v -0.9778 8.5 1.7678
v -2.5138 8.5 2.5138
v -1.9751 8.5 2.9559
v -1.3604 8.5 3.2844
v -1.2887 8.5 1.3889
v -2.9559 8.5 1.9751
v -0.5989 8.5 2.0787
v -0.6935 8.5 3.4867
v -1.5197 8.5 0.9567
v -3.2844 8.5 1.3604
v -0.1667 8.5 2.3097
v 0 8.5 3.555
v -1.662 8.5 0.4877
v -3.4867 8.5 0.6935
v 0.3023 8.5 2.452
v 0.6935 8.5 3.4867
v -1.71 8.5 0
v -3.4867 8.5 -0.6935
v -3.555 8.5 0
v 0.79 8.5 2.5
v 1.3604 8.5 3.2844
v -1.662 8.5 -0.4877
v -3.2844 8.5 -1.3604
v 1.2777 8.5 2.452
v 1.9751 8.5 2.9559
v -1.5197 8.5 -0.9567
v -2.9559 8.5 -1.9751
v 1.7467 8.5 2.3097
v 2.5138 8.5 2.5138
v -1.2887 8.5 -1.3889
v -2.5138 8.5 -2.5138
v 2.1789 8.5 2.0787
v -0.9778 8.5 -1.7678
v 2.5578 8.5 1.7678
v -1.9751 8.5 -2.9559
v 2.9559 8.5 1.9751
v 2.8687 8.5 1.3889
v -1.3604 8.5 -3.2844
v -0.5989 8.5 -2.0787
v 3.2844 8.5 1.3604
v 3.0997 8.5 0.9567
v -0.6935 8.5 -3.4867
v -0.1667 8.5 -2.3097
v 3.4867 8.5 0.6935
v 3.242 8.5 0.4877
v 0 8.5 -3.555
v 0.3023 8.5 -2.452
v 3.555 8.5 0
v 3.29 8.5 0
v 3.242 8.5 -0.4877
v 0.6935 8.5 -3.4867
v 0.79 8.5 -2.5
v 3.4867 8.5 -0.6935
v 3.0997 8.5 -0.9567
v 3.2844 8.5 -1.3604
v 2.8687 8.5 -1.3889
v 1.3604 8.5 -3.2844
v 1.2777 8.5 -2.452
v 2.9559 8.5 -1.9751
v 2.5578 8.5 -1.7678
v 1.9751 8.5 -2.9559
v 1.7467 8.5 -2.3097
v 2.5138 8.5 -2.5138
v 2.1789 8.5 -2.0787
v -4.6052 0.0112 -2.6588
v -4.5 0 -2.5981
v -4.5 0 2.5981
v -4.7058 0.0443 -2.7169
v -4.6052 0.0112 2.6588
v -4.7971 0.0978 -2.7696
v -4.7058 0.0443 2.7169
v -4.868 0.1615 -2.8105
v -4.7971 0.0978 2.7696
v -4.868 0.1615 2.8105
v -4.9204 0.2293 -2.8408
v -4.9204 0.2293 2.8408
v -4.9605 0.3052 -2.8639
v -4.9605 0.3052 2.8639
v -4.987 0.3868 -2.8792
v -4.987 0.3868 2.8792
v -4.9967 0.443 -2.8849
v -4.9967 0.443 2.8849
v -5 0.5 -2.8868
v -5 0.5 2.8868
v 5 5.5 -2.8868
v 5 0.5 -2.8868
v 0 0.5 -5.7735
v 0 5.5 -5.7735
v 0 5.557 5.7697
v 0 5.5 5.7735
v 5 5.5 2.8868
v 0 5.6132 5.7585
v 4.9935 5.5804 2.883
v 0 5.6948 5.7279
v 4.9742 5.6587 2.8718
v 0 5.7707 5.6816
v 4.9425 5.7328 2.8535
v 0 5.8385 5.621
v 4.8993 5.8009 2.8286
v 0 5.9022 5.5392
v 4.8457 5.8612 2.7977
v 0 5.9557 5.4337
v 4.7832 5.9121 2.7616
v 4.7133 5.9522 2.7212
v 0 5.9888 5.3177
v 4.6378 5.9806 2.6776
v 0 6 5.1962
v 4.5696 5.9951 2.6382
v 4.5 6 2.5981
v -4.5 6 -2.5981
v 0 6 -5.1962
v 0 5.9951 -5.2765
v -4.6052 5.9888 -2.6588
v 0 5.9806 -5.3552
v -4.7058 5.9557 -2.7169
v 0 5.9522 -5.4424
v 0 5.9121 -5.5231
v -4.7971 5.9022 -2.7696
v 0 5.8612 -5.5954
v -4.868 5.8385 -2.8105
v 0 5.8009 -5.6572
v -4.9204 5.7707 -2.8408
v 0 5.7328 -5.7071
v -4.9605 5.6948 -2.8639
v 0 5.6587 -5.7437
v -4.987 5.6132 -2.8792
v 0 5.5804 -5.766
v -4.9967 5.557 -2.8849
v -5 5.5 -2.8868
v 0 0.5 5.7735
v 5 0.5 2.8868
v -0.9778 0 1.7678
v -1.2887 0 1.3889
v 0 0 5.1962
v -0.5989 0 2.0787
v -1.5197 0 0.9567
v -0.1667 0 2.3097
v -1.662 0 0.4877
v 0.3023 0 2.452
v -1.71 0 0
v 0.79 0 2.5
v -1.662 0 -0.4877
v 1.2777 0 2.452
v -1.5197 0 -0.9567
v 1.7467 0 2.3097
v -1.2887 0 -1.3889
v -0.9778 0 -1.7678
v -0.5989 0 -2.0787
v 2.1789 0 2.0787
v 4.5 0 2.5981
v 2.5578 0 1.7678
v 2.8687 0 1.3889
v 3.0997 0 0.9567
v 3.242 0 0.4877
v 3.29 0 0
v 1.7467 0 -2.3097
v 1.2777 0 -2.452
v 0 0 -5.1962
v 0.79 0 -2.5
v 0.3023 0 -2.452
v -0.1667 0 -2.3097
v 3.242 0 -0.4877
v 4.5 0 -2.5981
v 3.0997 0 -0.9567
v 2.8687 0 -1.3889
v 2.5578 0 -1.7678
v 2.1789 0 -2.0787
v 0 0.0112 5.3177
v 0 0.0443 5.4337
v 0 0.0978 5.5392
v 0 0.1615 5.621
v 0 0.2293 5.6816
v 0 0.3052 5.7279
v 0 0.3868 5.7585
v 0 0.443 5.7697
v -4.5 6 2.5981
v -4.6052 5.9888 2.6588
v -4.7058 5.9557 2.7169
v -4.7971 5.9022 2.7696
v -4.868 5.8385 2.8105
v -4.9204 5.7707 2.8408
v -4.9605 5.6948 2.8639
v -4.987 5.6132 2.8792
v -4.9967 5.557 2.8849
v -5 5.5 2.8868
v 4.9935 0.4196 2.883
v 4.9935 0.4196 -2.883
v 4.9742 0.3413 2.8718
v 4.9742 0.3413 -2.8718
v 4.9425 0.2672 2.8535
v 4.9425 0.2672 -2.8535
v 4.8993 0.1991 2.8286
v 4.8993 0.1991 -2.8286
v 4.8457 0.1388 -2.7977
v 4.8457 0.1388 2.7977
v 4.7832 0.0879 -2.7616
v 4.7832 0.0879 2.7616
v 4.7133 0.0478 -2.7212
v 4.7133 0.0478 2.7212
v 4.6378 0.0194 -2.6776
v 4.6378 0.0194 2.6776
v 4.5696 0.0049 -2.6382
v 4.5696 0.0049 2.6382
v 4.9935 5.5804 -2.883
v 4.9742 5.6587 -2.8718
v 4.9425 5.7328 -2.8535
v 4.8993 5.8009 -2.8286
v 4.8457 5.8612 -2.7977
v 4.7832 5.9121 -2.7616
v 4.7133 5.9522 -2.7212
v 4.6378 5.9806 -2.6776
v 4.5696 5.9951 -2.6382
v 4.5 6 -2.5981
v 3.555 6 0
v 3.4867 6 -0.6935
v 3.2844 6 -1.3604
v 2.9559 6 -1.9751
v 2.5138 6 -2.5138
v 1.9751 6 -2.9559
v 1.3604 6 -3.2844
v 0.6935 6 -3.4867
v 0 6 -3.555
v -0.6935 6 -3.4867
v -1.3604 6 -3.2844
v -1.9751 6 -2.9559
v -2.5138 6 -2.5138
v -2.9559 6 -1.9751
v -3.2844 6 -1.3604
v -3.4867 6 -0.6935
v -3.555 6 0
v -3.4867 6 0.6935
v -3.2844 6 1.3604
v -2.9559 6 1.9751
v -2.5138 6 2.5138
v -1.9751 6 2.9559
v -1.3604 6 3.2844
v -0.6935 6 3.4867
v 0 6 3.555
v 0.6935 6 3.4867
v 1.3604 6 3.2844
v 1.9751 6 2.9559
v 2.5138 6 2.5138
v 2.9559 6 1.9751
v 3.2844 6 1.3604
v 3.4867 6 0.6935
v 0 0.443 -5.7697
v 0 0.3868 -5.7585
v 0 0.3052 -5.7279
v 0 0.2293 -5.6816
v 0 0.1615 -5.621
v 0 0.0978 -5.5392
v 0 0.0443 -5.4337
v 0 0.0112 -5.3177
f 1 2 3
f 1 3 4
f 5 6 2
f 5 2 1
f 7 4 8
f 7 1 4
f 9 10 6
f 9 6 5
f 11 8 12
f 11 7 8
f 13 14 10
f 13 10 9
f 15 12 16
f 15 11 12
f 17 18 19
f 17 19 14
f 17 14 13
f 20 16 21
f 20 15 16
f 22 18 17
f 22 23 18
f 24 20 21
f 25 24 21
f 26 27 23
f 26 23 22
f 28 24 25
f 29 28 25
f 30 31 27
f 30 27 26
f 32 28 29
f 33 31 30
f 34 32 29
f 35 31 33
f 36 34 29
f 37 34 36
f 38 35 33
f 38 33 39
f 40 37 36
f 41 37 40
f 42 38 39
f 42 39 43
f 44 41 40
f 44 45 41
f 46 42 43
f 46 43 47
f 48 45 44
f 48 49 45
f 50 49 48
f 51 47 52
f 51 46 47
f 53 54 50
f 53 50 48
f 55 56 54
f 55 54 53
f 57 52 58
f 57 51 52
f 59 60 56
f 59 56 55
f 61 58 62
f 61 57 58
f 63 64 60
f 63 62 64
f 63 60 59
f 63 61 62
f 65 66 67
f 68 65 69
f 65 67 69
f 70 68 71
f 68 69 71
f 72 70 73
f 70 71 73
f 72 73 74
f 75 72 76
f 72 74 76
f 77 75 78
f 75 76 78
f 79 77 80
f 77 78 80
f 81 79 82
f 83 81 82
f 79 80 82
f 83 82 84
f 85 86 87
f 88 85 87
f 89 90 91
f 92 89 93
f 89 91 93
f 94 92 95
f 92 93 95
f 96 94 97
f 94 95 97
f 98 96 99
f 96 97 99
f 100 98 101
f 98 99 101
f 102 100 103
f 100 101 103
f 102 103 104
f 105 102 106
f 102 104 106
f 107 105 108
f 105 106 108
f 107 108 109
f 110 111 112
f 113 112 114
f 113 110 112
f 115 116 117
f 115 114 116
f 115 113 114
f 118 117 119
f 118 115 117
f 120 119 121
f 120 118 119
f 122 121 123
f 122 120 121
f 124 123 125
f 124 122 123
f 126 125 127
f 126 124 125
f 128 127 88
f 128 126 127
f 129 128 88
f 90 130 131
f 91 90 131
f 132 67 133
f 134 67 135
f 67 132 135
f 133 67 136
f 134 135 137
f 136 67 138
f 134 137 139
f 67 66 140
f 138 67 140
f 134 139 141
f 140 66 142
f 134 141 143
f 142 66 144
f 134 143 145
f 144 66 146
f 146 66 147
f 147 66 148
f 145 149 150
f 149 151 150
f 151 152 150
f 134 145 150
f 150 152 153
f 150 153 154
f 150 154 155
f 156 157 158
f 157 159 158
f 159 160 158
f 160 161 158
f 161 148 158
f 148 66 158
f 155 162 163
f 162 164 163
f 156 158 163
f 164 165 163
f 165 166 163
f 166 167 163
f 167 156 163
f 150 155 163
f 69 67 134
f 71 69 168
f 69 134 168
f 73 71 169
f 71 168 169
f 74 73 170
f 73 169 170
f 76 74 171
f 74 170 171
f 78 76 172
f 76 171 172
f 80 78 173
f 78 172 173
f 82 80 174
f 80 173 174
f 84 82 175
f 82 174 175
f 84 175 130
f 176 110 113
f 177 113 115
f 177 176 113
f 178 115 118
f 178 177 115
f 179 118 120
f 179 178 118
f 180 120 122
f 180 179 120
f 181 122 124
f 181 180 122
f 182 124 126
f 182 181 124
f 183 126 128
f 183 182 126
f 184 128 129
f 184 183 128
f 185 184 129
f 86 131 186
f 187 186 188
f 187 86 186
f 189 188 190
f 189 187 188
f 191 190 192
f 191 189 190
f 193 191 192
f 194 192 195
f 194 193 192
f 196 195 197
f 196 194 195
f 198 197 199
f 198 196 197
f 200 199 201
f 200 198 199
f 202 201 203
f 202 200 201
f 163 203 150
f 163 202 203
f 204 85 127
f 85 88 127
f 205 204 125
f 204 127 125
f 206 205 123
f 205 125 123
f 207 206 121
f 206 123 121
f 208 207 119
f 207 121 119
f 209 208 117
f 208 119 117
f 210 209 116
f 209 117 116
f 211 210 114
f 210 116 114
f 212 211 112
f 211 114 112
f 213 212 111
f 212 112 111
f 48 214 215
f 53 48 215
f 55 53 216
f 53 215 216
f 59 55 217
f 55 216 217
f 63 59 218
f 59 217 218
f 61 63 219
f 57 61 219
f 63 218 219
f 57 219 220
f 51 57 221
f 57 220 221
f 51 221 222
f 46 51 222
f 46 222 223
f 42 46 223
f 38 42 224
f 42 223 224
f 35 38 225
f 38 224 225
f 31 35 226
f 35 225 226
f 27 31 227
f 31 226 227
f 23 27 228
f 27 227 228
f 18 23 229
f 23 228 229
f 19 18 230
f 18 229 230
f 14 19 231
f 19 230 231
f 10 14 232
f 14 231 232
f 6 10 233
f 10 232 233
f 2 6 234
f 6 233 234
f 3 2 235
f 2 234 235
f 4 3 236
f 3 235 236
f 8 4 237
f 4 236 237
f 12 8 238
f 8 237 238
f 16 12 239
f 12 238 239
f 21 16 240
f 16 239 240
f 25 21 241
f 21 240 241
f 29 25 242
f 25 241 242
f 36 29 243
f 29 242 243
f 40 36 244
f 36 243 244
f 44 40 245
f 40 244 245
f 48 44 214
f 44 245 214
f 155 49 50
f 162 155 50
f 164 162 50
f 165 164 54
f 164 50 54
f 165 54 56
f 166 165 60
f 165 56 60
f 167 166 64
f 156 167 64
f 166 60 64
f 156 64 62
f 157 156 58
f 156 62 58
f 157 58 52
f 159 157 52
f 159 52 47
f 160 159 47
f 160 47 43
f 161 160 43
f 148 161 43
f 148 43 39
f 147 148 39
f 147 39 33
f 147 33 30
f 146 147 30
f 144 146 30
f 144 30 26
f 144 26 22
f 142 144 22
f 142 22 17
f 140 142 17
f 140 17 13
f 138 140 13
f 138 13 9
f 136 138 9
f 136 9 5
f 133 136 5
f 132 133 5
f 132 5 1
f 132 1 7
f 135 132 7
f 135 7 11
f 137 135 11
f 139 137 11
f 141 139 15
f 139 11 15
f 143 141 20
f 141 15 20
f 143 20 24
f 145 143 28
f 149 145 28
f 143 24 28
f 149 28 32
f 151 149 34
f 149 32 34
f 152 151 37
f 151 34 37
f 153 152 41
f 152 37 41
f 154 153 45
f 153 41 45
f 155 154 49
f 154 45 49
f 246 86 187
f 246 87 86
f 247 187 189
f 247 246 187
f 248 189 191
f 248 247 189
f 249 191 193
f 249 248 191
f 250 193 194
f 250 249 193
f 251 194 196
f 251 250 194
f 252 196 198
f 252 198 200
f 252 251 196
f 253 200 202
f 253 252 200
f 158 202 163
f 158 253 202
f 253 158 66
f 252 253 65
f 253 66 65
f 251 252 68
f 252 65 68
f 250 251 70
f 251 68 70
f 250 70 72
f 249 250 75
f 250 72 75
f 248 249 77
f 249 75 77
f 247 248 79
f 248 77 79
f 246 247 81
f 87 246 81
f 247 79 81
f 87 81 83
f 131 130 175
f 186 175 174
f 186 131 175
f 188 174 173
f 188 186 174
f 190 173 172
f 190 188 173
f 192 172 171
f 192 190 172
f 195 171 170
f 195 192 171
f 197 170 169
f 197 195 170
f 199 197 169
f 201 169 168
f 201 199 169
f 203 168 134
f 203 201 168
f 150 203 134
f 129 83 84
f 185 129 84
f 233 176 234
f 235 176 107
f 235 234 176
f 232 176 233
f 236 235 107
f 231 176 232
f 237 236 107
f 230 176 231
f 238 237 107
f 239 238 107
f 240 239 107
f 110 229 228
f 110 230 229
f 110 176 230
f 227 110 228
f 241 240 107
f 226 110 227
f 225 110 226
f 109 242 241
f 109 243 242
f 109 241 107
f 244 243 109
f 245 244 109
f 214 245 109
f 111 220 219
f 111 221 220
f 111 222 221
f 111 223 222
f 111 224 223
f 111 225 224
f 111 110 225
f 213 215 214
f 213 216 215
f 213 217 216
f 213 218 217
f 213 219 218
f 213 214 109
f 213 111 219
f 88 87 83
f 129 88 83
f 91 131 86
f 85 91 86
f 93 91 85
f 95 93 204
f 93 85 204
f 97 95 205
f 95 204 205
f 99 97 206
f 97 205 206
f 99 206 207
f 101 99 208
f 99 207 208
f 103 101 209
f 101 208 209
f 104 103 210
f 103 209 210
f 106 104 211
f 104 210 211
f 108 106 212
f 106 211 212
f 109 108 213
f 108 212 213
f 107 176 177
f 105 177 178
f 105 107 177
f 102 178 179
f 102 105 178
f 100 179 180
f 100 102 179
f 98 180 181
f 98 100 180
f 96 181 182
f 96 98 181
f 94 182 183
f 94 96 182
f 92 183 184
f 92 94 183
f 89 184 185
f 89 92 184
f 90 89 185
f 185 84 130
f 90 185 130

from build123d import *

# Parameters (mm, degrees)
BOSS_EXTRUDE1_DEPTH = 6
SKETCH2_R           = 3.555
BOSS_EXTRUDE2_DEPTH = 2.5
SKETCH3_R           = 2.5
CUT_EXTRUDE1_DEPTH  = 9.5
FILLET1_R           = 0.5


with BuildPart() as part:
    # Sketch1 → Boss-Extrude1 (new body)
    with BuildSketch(Plane(origin=(0, 0, 0), x_dir=(1, 0, 0), z_dir=(0, 1, 0))):
        Polygon((5, -2.886751346), (5, 2.886751346), (0, 5.773502692), (-5, 2.886751346), (-5, -2.886751346), (0, -5.773502692), align=None)
    extrude(amount=BOSS_EXTRUDE1_DEPTH)

    # Sketch2 → Boss-Extrude2 (add)
    with BuildSketch(Plane(origin=(0, 6, 0), x_dir=(1, 0, 0), z_dir=(0, 1, 0))):
        Circle(SKETCH2_R)
    extrude(amount=BOSS_EXTRUDE2_DEPTH)

    # Sketch3 → Cut-Extrude1 (cut, through all)
    with BuildSketch(Plane(origin=(0, 8.5, 0), x_dir=(1, 0, 0), z_dir=(0, 1, 0))):
        with Locations((0.79, 0)):
            Circle(SKETCH3_R)
    extrude(amount=-CUT_EXTRUDE1_DEPTH, mode=Mode.SUBTRACT)

    # Fillet1
    fillet1_edges = [part.edges().sort_by_distance(p)[0] for p in [
        (2.5, 6, -4.330127019),
        (-2.5, 6, -4.330127019),
        (-5, 6, 0),
        (-2.5, 6, 4.330127019),
        (2.5, 6, 4.330127019),
        (-2.5, 0, 4.330127019),
        (-5, 0, 0),
        (-2.5, 0, -4.330127019),
        (2.5, 0, -4.330127019),
        (5, 0, 0),
        (2.5, 0, 4.330127019),
        (5, 6, 0),
    ]]
    fillet(fillet1_edges, radius=FILLET1_R)


solid = part.part
